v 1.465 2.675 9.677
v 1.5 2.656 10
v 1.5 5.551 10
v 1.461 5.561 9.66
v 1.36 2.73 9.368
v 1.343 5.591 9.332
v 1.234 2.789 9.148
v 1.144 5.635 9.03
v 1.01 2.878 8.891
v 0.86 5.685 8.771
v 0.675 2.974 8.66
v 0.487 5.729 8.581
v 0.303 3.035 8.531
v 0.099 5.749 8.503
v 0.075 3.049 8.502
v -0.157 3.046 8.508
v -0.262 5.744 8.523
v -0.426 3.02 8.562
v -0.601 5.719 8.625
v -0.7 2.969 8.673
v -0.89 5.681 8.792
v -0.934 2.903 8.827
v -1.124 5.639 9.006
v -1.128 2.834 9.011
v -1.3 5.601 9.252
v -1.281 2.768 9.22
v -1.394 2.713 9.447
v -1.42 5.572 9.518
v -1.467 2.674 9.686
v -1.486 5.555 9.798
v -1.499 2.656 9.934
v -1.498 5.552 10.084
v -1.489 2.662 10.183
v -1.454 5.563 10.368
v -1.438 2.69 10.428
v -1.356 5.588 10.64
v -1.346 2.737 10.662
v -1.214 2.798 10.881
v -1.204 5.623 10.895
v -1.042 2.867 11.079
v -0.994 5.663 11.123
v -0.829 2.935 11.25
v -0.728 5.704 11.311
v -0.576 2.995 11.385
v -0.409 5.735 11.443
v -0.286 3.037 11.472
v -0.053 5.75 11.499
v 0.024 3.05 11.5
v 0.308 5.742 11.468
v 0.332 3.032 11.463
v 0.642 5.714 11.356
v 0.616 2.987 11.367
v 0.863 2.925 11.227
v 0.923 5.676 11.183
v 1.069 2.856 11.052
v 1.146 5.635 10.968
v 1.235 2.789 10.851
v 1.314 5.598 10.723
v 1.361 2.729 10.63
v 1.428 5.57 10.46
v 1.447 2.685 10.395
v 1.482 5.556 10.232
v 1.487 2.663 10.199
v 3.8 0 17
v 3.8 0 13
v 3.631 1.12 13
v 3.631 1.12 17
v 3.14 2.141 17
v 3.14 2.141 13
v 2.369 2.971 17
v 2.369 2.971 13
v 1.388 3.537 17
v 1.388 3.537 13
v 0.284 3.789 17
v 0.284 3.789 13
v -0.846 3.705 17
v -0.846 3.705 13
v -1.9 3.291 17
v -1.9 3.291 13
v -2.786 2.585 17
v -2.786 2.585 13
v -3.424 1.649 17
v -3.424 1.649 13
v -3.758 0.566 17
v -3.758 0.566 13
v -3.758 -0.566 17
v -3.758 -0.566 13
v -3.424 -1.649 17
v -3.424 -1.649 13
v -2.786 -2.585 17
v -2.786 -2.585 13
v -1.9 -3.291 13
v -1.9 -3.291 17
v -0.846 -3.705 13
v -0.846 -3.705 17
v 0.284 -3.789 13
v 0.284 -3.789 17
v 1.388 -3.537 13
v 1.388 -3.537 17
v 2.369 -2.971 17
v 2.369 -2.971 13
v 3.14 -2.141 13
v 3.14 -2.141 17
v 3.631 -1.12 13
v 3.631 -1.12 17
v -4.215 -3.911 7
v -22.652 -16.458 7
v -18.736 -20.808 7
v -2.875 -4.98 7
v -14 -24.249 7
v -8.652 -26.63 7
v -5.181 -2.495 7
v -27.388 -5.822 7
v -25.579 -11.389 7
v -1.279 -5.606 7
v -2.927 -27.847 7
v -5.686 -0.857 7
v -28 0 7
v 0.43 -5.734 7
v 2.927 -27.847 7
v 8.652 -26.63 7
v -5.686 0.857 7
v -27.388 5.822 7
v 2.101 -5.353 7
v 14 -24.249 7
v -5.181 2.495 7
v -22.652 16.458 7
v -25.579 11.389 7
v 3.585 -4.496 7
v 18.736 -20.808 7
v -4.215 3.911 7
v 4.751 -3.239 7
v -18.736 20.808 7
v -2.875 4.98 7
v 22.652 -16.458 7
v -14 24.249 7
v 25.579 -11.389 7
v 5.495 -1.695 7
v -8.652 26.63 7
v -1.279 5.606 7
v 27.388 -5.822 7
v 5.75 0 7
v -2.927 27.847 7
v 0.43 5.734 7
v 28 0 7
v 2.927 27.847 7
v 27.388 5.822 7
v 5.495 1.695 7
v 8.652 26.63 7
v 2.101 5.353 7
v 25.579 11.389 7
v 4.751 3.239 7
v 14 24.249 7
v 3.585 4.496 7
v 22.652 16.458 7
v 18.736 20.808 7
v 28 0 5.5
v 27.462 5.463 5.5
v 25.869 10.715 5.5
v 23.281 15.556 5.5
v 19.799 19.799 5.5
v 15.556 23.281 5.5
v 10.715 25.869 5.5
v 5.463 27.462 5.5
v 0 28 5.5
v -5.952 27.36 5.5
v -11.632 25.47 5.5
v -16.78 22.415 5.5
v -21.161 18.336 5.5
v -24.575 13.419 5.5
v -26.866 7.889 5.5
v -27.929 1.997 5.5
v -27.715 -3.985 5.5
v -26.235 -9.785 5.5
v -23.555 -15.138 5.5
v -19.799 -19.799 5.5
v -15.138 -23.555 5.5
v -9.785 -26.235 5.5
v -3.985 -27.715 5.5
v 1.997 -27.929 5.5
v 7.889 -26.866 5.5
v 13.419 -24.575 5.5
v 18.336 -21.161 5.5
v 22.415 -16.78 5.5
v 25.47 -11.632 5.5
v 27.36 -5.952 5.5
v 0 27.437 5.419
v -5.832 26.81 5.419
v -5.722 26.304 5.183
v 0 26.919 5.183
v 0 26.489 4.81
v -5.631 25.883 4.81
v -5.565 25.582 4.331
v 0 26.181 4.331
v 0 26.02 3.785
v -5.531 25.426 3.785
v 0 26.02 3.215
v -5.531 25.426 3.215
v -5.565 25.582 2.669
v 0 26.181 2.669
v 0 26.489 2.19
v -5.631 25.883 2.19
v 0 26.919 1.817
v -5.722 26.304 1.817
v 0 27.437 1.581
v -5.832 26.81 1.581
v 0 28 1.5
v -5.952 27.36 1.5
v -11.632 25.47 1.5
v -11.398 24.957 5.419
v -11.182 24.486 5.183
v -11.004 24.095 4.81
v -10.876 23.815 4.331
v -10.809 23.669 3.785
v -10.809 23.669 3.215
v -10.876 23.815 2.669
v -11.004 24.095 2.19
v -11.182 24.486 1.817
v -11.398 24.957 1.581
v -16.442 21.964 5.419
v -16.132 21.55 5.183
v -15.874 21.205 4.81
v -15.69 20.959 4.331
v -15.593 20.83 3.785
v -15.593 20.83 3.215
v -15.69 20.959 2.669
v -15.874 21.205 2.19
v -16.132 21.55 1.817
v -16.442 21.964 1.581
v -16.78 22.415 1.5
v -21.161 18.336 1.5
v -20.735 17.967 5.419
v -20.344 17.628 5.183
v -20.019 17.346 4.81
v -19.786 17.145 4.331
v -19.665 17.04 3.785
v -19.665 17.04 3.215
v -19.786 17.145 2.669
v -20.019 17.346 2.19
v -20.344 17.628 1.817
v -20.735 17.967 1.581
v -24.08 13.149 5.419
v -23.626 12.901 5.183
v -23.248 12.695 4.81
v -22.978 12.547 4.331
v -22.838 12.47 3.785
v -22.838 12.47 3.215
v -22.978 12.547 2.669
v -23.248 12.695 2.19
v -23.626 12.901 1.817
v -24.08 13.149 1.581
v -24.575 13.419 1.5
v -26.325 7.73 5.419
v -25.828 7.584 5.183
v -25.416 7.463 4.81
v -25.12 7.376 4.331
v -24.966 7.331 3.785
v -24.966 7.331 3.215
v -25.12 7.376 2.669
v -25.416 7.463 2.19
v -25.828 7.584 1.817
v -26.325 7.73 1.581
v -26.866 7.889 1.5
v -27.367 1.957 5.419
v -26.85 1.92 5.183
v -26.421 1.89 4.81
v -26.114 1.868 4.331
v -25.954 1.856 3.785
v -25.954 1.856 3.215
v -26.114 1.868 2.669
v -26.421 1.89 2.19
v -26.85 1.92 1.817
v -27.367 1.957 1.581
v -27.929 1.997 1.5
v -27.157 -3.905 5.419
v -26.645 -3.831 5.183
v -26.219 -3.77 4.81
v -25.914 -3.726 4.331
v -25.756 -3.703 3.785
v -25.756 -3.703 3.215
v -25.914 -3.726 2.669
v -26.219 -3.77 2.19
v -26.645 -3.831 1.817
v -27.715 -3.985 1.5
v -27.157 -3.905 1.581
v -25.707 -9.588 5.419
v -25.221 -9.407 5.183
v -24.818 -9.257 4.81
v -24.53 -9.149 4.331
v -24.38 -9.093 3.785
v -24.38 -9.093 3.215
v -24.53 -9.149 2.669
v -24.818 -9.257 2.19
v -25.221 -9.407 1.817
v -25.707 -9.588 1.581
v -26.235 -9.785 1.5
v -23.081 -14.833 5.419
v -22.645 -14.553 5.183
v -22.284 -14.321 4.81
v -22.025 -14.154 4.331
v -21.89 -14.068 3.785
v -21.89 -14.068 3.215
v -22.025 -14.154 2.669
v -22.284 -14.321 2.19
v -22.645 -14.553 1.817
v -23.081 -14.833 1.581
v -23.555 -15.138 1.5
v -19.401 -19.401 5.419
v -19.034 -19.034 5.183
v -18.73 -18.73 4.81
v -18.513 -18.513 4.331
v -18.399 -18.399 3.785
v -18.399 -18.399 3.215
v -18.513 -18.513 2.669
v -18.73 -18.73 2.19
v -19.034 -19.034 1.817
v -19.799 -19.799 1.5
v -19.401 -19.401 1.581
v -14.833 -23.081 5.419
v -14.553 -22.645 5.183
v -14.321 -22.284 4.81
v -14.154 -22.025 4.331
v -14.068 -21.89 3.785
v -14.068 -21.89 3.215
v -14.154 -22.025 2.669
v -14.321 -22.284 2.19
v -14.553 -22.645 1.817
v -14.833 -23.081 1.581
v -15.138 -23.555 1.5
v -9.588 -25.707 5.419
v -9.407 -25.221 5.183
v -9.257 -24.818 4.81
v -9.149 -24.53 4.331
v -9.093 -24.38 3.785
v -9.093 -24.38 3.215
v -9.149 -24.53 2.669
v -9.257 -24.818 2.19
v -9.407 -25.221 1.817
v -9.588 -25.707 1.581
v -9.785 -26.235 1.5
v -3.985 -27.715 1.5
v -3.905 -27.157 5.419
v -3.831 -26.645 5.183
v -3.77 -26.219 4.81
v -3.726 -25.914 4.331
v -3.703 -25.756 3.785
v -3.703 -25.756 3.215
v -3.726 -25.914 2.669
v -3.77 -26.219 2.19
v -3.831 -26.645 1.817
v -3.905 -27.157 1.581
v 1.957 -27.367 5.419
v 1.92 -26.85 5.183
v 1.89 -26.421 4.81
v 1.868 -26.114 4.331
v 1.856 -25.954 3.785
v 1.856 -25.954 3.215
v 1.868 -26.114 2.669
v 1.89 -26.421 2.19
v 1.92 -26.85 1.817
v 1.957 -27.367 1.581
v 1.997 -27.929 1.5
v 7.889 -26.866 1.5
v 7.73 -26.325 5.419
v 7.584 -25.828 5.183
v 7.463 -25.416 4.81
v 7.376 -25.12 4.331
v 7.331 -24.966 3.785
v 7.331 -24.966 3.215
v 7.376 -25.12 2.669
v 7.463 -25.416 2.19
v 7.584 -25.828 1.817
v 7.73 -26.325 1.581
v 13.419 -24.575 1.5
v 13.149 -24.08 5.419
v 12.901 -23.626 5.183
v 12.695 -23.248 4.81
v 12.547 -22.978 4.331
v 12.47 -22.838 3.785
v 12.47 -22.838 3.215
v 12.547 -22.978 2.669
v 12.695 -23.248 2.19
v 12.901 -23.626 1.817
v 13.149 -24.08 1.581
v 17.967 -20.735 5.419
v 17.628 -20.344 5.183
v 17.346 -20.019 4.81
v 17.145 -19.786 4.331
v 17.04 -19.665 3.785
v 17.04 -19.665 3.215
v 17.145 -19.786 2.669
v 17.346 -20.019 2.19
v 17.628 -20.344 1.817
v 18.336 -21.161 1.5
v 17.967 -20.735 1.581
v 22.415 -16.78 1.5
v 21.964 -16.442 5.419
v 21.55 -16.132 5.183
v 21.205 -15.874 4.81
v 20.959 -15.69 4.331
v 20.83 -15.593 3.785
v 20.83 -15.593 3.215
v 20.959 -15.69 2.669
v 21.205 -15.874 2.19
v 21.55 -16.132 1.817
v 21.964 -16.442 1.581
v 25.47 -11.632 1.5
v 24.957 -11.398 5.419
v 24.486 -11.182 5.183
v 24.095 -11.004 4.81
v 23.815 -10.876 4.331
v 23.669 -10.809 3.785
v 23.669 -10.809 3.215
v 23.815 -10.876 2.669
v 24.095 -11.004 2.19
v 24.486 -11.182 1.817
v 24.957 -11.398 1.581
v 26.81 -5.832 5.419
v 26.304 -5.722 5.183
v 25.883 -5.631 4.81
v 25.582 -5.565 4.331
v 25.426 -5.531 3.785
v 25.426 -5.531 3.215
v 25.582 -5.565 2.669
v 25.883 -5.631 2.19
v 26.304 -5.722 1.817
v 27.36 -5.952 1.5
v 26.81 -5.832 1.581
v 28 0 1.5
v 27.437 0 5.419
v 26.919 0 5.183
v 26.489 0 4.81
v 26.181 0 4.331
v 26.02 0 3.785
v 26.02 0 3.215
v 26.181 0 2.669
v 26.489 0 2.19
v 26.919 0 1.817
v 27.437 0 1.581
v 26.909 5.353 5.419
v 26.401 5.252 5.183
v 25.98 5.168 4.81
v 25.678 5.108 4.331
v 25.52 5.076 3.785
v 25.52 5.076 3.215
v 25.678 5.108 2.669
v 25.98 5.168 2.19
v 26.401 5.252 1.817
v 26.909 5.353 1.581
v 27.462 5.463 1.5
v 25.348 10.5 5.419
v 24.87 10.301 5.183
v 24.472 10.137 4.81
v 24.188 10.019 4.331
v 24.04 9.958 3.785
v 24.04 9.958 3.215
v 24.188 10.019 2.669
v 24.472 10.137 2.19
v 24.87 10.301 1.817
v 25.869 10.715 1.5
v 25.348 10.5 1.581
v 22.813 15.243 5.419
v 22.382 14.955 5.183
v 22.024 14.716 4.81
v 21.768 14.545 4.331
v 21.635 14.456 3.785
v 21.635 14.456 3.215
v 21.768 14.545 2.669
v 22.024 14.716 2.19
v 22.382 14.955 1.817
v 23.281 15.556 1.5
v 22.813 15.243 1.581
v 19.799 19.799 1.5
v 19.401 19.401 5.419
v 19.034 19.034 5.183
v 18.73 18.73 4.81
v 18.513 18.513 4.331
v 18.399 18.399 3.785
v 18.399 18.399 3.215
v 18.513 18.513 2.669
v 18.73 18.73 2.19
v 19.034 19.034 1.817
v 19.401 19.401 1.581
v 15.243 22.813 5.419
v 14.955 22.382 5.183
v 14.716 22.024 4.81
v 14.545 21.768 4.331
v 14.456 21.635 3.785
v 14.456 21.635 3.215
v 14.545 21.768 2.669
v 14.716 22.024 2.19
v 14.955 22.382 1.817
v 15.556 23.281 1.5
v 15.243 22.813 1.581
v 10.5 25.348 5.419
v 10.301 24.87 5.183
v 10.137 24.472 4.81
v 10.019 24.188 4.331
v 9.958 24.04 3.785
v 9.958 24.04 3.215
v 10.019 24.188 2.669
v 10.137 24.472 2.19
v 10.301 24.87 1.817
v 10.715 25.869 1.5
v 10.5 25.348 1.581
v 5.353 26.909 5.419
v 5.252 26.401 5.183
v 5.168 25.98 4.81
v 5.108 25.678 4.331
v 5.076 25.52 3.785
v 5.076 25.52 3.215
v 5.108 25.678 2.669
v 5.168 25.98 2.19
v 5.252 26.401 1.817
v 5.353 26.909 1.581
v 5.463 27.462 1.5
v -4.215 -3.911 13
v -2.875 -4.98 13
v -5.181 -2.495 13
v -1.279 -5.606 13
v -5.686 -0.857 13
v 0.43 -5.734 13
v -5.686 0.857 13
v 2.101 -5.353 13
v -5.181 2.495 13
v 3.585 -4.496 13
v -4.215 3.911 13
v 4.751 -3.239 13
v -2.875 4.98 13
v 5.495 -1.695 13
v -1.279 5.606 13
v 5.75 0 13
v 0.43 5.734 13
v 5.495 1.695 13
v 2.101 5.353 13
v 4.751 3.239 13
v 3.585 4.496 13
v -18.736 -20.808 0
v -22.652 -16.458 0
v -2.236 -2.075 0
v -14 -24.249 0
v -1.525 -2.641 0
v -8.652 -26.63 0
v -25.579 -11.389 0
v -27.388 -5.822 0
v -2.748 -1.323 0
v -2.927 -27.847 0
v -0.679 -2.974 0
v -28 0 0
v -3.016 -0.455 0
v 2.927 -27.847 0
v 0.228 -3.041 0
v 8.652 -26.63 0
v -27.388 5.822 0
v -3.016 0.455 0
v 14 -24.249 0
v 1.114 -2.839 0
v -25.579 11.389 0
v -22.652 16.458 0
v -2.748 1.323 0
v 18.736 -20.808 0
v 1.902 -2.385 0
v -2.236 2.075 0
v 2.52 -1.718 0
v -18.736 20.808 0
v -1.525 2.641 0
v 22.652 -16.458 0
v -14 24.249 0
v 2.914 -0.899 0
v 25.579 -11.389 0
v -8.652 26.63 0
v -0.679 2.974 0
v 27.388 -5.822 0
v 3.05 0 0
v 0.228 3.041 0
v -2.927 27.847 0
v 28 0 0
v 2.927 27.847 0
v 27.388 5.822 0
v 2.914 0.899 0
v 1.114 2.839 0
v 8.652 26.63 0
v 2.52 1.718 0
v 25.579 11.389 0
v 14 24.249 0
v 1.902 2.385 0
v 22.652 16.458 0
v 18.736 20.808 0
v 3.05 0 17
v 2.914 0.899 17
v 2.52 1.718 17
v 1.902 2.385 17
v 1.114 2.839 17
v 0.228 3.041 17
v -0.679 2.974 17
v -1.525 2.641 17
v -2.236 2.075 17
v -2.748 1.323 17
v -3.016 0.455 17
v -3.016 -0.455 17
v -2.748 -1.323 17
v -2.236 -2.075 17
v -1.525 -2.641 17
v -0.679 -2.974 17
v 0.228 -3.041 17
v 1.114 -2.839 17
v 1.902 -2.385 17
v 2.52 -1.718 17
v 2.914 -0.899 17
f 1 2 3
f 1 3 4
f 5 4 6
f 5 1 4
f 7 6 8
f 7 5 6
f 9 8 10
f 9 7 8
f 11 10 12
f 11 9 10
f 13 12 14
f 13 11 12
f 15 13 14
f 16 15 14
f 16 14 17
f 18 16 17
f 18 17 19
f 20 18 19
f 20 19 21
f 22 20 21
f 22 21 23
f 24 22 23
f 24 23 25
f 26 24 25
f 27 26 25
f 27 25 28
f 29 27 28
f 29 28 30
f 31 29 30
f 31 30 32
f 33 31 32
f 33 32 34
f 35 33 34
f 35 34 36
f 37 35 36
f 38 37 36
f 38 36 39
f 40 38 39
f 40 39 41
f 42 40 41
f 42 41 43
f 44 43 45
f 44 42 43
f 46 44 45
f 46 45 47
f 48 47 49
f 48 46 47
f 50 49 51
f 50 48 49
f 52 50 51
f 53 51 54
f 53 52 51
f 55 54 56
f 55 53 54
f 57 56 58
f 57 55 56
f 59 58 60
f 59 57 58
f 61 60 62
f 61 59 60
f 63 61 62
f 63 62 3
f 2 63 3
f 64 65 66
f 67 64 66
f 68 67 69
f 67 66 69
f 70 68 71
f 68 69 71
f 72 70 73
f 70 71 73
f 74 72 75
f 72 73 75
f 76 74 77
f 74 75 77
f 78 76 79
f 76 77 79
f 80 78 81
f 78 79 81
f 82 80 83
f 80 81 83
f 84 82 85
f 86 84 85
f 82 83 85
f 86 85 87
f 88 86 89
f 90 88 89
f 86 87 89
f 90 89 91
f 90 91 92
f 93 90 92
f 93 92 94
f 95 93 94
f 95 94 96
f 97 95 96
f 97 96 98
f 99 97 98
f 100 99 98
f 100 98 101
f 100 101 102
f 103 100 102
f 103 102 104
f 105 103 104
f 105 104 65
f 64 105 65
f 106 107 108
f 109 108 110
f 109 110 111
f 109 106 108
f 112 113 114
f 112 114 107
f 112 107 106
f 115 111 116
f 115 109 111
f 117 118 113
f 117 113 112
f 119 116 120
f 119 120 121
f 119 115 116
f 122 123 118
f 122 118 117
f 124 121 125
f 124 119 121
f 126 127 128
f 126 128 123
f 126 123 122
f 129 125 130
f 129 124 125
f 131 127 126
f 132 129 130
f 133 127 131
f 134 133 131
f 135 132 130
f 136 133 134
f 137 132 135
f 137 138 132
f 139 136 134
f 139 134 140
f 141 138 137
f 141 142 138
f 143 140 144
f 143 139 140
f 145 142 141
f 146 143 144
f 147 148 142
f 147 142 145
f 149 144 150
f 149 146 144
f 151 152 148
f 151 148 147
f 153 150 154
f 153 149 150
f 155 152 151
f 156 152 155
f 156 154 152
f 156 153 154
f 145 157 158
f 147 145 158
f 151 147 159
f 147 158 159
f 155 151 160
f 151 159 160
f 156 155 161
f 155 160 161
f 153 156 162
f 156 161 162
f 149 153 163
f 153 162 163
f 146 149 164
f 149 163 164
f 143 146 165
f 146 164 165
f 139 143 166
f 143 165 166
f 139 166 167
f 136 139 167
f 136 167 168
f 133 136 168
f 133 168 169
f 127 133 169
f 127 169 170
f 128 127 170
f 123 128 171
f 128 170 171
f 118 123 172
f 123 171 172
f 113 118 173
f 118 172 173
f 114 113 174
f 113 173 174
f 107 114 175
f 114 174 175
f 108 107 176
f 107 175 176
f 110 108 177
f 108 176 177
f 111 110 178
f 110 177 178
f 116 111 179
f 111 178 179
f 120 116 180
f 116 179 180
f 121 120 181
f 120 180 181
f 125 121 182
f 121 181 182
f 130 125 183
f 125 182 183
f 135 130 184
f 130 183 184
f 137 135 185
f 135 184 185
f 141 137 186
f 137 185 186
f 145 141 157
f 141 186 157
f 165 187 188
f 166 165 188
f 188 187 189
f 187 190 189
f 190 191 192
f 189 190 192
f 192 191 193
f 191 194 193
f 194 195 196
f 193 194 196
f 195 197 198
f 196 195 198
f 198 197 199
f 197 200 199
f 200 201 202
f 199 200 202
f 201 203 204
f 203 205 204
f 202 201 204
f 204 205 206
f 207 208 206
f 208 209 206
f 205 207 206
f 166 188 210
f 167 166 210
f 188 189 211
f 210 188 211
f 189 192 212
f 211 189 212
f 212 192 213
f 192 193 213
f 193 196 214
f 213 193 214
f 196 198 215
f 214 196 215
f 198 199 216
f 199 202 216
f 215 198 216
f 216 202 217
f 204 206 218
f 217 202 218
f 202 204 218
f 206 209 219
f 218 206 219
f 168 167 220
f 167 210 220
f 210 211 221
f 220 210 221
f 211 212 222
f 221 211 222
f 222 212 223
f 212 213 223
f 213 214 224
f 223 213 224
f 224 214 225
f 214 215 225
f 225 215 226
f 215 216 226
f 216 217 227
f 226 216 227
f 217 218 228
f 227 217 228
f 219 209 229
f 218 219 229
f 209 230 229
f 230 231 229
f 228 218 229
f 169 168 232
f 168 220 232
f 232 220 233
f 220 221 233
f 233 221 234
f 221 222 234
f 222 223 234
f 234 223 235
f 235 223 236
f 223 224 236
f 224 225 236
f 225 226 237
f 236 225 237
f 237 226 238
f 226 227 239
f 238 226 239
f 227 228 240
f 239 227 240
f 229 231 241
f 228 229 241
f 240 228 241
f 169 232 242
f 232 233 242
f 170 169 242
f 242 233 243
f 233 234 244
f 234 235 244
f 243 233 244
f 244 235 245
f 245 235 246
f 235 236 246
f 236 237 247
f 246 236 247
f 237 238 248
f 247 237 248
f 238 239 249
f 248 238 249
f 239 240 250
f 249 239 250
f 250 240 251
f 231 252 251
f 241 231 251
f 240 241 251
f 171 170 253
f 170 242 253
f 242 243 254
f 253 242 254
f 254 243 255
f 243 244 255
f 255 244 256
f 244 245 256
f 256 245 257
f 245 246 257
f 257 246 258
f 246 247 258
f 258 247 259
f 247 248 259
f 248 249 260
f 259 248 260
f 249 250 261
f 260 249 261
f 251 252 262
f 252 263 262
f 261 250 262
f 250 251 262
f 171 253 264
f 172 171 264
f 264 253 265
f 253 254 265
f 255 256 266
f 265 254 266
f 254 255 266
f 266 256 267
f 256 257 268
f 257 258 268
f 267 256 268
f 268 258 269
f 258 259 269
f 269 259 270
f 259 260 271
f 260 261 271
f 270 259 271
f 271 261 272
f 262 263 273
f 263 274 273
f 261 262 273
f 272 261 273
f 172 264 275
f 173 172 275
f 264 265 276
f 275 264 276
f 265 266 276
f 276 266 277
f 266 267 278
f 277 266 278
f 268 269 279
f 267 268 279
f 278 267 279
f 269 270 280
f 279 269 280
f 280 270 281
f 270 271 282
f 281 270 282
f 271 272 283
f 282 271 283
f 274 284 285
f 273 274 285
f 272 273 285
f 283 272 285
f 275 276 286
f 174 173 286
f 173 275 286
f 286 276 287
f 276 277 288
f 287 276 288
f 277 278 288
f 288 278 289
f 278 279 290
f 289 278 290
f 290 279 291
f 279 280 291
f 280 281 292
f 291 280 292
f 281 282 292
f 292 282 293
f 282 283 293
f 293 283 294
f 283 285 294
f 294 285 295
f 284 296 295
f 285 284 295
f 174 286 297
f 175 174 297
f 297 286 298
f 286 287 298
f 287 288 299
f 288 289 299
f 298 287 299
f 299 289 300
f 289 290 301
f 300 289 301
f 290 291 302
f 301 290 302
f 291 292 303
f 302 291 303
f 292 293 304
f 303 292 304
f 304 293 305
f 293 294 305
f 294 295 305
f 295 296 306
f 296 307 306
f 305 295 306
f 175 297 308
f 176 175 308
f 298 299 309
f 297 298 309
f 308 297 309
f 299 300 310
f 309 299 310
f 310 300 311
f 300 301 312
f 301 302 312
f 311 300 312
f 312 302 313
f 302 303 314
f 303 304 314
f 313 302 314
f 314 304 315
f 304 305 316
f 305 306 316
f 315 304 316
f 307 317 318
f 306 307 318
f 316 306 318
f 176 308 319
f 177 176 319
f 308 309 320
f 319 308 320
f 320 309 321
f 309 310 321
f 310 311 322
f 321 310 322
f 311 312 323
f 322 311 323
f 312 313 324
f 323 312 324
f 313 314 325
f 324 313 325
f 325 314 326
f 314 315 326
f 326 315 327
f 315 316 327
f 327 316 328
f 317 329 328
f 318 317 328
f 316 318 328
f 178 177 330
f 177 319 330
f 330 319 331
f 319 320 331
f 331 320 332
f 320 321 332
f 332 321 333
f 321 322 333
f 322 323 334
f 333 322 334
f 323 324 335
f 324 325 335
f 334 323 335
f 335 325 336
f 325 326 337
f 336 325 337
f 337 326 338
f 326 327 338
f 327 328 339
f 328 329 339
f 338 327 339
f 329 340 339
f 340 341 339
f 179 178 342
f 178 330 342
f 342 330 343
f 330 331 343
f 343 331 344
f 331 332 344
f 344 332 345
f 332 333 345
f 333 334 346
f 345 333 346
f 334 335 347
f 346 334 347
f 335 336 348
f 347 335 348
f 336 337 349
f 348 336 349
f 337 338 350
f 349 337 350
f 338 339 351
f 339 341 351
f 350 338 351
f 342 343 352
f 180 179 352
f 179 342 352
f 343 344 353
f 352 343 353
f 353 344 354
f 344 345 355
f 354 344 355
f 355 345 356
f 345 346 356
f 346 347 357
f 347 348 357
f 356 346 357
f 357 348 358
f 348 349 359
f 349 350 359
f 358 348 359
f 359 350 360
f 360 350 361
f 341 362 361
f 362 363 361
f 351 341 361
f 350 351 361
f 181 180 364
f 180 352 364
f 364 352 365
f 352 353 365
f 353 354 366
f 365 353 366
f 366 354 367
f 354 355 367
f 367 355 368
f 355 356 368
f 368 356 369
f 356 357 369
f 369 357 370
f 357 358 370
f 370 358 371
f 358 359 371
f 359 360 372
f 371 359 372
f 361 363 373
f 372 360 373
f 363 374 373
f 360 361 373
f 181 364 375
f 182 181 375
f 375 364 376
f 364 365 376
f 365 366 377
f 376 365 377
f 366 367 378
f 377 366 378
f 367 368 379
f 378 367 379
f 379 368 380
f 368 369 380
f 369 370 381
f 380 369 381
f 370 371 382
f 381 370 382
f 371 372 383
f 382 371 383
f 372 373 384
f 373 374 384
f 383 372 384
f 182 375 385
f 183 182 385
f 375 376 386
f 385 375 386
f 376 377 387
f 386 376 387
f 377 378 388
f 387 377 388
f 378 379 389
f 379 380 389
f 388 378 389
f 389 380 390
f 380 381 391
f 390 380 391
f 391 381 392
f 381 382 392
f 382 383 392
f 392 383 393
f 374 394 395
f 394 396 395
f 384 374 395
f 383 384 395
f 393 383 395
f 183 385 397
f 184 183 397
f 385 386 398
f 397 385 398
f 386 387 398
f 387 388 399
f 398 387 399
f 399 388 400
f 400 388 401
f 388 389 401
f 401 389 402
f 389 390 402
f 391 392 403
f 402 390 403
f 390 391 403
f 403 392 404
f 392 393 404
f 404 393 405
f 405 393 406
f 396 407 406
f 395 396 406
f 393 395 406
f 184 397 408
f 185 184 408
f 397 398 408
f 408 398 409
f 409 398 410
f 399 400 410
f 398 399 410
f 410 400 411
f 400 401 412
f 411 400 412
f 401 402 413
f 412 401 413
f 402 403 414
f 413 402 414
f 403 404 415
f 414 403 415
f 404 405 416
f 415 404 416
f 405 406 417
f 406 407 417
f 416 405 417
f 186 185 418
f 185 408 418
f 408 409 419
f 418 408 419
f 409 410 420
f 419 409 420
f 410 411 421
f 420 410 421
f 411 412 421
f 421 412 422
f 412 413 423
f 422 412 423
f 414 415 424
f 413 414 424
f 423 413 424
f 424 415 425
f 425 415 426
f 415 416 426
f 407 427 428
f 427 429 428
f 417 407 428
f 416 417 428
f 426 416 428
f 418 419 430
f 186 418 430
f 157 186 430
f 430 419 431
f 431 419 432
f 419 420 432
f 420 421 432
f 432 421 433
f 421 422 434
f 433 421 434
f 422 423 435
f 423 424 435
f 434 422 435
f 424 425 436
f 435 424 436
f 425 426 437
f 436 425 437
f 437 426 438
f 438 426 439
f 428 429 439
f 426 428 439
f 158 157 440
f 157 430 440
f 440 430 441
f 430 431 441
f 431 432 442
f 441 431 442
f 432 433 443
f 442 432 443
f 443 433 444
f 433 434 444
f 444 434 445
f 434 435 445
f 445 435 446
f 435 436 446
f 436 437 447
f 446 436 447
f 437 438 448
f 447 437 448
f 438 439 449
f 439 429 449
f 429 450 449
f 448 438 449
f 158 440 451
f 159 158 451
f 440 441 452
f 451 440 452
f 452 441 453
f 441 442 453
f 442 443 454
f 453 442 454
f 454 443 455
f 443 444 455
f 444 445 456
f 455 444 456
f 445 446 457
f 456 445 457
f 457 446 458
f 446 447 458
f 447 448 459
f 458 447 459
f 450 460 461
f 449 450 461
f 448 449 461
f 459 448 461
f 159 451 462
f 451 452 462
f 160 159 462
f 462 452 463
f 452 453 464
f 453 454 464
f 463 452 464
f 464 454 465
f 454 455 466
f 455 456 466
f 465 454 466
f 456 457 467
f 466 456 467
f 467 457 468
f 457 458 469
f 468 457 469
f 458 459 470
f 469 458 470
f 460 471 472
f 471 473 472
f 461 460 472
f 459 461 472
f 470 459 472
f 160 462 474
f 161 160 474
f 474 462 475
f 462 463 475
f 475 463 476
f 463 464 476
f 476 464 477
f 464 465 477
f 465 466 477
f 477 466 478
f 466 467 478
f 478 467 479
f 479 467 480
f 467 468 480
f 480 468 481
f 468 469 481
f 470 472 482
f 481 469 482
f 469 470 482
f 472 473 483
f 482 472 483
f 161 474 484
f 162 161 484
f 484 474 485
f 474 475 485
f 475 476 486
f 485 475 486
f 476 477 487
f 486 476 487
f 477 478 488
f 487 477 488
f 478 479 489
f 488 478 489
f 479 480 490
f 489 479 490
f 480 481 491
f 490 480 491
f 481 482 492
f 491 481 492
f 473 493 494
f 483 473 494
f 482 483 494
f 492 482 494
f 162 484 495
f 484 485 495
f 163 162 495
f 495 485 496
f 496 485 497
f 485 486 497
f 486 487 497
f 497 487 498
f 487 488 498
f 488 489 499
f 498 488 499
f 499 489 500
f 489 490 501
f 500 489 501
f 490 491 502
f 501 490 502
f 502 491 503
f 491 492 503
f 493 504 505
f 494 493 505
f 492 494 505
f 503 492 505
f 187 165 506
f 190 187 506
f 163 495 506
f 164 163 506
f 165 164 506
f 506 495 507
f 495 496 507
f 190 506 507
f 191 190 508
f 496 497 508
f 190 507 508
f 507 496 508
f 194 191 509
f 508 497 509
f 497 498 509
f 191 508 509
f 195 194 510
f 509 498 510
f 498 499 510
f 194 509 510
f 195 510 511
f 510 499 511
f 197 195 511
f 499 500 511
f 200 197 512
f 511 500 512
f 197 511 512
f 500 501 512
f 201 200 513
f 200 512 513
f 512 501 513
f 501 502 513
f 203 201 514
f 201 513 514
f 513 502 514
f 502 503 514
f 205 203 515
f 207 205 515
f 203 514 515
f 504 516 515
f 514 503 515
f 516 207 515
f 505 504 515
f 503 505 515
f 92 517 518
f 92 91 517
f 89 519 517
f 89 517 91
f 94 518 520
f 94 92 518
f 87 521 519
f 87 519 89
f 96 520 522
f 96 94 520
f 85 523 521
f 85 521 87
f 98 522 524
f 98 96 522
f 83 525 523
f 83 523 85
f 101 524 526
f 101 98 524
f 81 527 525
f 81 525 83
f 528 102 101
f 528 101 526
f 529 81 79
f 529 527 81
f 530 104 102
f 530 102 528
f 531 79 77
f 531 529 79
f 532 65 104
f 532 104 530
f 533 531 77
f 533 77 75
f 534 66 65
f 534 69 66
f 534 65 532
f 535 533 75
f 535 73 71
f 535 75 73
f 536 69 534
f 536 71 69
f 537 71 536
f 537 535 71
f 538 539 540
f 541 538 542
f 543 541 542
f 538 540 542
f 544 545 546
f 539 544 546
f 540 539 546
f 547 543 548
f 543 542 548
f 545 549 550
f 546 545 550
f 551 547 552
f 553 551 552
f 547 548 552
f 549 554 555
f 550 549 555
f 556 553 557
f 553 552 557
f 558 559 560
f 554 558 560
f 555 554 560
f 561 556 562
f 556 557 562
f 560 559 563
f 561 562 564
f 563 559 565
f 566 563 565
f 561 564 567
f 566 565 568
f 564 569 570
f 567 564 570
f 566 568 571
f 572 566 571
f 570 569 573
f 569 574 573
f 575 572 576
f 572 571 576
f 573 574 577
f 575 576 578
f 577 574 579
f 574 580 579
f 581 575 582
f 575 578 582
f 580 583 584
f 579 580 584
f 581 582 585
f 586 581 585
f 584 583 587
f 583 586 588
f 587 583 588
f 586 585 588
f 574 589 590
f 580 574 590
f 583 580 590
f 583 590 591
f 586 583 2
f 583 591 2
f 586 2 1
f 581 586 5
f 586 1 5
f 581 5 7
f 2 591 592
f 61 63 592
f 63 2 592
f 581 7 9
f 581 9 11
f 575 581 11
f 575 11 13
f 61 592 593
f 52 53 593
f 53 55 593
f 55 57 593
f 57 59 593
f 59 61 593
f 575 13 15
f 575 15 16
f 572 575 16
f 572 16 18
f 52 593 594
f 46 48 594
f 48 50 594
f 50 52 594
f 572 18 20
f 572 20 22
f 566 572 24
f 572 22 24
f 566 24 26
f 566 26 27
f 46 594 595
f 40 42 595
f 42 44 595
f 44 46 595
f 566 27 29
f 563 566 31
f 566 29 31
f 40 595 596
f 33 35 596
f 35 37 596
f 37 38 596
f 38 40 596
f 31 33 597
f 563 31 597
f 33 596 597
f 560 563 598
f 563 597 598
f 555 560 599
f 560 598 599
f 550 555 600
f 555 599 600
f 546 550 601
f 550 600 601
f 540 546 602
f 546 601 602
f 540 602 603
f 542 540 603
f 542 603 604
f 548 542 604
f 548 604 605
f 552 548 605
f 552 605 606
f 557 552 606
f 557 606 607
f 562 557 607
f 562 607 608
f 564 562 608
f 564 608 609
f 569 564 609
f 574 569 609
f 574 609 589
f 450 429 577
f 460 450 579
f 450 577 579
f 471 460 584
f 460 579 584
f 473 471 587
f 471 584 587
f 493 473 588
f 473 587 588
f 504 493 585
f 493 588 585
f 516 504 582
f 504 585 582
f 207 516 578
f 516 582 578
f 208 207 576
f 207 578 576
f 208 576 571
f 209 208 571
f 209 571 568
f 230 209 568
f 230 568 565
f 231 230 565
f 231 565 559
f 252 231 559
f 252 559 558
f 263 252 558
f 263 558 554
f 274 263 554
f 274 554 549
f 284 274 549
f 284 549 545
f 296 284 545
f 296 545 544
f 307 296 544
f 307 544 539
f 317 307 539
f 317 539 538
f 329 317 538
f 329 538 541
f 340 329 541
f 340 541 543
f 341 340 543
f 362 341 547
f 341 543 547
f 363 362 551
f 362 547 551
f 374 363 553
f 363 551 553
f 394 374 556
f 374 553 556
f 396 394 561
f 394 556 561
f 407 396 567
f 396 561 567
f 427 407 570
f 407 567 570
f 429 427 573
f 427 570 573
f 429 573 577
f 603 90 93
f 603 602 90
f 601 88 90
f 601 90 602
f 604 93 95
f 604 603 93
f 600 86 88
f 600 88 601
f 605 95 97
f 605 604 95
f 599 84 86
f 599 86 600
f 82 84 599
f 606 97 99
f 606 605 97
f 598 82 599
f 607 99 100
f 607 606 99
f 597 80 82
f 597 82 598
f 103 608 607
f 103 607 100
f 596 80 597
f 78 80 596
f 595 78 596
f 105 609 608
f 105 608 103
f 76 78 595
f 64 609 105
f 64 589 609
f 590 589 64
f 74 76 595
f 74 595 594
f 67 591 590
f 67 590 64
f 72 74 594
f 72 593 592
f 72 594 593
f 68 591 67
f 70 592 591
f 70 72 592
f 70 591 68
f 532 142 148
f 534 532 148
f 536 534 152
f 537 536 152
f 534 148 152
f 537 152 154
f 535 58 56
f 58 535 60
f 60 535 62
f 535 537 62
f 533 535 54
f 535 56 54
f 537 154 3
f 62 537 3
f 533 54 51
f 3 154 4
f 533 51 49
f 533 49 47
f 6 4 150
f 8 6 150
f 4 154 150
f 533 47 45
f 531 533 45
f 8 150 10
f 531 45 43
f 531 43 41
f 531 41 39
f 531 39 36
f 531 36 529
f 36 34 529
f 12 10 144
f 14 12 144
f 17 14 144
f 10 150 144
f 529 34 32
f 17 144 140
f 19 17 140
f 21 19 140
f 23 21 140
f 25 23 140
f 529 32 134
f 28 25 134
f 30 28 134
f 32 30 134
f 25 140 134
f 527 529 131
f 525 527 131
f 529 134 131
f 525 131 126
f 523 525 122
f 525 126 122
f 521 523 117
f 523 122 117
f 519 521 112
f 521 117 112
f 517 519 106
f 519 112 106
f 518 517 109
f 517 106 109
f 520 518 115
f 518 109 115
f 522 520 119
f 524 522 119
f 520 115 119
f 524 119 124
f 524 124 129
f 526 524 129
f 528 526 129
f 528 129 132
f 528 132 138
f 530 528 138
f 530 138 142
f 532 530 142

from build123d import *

# Parameters (mm, degrees)
ESQUISSE1_R             = 28
BOSS_EXTRU_1_DEPTH      = 7
ESQUISSE2_R             = 3.8
BOSS_EXTRU_2_DEPTH      = 10
ESQUISSE3_R             = 3.05
ENL_V_MAT_EXTRU_1_DEPTH = 18
ESQUISSE4_R             = 2
ESQUISSE5_R             = 5.75
ESQUISSE5_R_2           = 3.8
BOSS_EXTRU_3_DEPTH      = 6
ENL_V_MAT_EXTRU_2_REACH = 30
ESQUISSE6_R             = 1.5


with BuildPart() as part:
    # Esquisse1 → Boss.-Extru.1 (new body)
    with BuildSketch(Plane.XY):
        Circle(ESQUISSE1_R)
    extrude(amount=BOSS_EXTRU_1_DEPTH)

    # Esquisse2 → Boss.-Extru.2 (add)
    with BuildSketch(Plane.XY.offset(7)):
        Circle(ESQUISSE2_R)
    extrude(amount=BOSS_EXTRU_2_DEPTH)

    # Esquisse3 → Enlèv. mat.-Extru.1 (cut, through all)
    with BuildSketch(Plane.XY.offset(17)):
        Circle(ESQUISSE3_R)
    extrude(amount=-ENL_V_MAT_EXTRU_1_DEPTH, mode=Mode.SUBTRACT)

    # Esquisse4 → Enlèvement de matière-Révolution1 (revolve, cut)
    with BuildSketch(Plane(origin=(0, 0, 0), x_dir=(0, 0, -1), z_dir=(1, 0, 0))):
        with Locations((-3.5, 28)):
            Circle(ESQUISSE4_R)
    revolve(axis=Axis((0, 0, 0), (0, 0, 1)), mode=Mode.SUBTRACT)

    # Esquisse5 → Boss.-Extru.3 (add)
    with BuildSketch(Plane.XY.offset(7)):
        Circle(ESQUISSE5_R)
        Circle(ESQUISSE5_R_2, mode=Mode.SUBTRACT)
    extrude(amount=BOSS_EXTRU_3_DEPTH)

    # Esquisse6 → Enlèv. mat.-Extru.2 (cut, up to next)
    with BuildSketch(Plane(origin=(0, 0, 0), x_dir=(1, 0, 0), z_dir=(0, 1, 0)), mode=Mode.PRIVATE) as enl_v_mat_extru_2_sk1:
        with Locations((0, -10)):
            Circle(ESQUISSE6_R)
    enl_v_mat_extru_2_tool1 = extrude(enl_v_mat_extru_2_sk1.sketch, amount=ENL_V_MAT_EXTRU_2_REACH, mode=Mode.PRIVATE) & part.part
    add(enl_v_mat_extru_2_tool1.solids().sort_by_distance((0, 0, 10))[0], mode=Mode.SUBTRACT)


solid = part.part
